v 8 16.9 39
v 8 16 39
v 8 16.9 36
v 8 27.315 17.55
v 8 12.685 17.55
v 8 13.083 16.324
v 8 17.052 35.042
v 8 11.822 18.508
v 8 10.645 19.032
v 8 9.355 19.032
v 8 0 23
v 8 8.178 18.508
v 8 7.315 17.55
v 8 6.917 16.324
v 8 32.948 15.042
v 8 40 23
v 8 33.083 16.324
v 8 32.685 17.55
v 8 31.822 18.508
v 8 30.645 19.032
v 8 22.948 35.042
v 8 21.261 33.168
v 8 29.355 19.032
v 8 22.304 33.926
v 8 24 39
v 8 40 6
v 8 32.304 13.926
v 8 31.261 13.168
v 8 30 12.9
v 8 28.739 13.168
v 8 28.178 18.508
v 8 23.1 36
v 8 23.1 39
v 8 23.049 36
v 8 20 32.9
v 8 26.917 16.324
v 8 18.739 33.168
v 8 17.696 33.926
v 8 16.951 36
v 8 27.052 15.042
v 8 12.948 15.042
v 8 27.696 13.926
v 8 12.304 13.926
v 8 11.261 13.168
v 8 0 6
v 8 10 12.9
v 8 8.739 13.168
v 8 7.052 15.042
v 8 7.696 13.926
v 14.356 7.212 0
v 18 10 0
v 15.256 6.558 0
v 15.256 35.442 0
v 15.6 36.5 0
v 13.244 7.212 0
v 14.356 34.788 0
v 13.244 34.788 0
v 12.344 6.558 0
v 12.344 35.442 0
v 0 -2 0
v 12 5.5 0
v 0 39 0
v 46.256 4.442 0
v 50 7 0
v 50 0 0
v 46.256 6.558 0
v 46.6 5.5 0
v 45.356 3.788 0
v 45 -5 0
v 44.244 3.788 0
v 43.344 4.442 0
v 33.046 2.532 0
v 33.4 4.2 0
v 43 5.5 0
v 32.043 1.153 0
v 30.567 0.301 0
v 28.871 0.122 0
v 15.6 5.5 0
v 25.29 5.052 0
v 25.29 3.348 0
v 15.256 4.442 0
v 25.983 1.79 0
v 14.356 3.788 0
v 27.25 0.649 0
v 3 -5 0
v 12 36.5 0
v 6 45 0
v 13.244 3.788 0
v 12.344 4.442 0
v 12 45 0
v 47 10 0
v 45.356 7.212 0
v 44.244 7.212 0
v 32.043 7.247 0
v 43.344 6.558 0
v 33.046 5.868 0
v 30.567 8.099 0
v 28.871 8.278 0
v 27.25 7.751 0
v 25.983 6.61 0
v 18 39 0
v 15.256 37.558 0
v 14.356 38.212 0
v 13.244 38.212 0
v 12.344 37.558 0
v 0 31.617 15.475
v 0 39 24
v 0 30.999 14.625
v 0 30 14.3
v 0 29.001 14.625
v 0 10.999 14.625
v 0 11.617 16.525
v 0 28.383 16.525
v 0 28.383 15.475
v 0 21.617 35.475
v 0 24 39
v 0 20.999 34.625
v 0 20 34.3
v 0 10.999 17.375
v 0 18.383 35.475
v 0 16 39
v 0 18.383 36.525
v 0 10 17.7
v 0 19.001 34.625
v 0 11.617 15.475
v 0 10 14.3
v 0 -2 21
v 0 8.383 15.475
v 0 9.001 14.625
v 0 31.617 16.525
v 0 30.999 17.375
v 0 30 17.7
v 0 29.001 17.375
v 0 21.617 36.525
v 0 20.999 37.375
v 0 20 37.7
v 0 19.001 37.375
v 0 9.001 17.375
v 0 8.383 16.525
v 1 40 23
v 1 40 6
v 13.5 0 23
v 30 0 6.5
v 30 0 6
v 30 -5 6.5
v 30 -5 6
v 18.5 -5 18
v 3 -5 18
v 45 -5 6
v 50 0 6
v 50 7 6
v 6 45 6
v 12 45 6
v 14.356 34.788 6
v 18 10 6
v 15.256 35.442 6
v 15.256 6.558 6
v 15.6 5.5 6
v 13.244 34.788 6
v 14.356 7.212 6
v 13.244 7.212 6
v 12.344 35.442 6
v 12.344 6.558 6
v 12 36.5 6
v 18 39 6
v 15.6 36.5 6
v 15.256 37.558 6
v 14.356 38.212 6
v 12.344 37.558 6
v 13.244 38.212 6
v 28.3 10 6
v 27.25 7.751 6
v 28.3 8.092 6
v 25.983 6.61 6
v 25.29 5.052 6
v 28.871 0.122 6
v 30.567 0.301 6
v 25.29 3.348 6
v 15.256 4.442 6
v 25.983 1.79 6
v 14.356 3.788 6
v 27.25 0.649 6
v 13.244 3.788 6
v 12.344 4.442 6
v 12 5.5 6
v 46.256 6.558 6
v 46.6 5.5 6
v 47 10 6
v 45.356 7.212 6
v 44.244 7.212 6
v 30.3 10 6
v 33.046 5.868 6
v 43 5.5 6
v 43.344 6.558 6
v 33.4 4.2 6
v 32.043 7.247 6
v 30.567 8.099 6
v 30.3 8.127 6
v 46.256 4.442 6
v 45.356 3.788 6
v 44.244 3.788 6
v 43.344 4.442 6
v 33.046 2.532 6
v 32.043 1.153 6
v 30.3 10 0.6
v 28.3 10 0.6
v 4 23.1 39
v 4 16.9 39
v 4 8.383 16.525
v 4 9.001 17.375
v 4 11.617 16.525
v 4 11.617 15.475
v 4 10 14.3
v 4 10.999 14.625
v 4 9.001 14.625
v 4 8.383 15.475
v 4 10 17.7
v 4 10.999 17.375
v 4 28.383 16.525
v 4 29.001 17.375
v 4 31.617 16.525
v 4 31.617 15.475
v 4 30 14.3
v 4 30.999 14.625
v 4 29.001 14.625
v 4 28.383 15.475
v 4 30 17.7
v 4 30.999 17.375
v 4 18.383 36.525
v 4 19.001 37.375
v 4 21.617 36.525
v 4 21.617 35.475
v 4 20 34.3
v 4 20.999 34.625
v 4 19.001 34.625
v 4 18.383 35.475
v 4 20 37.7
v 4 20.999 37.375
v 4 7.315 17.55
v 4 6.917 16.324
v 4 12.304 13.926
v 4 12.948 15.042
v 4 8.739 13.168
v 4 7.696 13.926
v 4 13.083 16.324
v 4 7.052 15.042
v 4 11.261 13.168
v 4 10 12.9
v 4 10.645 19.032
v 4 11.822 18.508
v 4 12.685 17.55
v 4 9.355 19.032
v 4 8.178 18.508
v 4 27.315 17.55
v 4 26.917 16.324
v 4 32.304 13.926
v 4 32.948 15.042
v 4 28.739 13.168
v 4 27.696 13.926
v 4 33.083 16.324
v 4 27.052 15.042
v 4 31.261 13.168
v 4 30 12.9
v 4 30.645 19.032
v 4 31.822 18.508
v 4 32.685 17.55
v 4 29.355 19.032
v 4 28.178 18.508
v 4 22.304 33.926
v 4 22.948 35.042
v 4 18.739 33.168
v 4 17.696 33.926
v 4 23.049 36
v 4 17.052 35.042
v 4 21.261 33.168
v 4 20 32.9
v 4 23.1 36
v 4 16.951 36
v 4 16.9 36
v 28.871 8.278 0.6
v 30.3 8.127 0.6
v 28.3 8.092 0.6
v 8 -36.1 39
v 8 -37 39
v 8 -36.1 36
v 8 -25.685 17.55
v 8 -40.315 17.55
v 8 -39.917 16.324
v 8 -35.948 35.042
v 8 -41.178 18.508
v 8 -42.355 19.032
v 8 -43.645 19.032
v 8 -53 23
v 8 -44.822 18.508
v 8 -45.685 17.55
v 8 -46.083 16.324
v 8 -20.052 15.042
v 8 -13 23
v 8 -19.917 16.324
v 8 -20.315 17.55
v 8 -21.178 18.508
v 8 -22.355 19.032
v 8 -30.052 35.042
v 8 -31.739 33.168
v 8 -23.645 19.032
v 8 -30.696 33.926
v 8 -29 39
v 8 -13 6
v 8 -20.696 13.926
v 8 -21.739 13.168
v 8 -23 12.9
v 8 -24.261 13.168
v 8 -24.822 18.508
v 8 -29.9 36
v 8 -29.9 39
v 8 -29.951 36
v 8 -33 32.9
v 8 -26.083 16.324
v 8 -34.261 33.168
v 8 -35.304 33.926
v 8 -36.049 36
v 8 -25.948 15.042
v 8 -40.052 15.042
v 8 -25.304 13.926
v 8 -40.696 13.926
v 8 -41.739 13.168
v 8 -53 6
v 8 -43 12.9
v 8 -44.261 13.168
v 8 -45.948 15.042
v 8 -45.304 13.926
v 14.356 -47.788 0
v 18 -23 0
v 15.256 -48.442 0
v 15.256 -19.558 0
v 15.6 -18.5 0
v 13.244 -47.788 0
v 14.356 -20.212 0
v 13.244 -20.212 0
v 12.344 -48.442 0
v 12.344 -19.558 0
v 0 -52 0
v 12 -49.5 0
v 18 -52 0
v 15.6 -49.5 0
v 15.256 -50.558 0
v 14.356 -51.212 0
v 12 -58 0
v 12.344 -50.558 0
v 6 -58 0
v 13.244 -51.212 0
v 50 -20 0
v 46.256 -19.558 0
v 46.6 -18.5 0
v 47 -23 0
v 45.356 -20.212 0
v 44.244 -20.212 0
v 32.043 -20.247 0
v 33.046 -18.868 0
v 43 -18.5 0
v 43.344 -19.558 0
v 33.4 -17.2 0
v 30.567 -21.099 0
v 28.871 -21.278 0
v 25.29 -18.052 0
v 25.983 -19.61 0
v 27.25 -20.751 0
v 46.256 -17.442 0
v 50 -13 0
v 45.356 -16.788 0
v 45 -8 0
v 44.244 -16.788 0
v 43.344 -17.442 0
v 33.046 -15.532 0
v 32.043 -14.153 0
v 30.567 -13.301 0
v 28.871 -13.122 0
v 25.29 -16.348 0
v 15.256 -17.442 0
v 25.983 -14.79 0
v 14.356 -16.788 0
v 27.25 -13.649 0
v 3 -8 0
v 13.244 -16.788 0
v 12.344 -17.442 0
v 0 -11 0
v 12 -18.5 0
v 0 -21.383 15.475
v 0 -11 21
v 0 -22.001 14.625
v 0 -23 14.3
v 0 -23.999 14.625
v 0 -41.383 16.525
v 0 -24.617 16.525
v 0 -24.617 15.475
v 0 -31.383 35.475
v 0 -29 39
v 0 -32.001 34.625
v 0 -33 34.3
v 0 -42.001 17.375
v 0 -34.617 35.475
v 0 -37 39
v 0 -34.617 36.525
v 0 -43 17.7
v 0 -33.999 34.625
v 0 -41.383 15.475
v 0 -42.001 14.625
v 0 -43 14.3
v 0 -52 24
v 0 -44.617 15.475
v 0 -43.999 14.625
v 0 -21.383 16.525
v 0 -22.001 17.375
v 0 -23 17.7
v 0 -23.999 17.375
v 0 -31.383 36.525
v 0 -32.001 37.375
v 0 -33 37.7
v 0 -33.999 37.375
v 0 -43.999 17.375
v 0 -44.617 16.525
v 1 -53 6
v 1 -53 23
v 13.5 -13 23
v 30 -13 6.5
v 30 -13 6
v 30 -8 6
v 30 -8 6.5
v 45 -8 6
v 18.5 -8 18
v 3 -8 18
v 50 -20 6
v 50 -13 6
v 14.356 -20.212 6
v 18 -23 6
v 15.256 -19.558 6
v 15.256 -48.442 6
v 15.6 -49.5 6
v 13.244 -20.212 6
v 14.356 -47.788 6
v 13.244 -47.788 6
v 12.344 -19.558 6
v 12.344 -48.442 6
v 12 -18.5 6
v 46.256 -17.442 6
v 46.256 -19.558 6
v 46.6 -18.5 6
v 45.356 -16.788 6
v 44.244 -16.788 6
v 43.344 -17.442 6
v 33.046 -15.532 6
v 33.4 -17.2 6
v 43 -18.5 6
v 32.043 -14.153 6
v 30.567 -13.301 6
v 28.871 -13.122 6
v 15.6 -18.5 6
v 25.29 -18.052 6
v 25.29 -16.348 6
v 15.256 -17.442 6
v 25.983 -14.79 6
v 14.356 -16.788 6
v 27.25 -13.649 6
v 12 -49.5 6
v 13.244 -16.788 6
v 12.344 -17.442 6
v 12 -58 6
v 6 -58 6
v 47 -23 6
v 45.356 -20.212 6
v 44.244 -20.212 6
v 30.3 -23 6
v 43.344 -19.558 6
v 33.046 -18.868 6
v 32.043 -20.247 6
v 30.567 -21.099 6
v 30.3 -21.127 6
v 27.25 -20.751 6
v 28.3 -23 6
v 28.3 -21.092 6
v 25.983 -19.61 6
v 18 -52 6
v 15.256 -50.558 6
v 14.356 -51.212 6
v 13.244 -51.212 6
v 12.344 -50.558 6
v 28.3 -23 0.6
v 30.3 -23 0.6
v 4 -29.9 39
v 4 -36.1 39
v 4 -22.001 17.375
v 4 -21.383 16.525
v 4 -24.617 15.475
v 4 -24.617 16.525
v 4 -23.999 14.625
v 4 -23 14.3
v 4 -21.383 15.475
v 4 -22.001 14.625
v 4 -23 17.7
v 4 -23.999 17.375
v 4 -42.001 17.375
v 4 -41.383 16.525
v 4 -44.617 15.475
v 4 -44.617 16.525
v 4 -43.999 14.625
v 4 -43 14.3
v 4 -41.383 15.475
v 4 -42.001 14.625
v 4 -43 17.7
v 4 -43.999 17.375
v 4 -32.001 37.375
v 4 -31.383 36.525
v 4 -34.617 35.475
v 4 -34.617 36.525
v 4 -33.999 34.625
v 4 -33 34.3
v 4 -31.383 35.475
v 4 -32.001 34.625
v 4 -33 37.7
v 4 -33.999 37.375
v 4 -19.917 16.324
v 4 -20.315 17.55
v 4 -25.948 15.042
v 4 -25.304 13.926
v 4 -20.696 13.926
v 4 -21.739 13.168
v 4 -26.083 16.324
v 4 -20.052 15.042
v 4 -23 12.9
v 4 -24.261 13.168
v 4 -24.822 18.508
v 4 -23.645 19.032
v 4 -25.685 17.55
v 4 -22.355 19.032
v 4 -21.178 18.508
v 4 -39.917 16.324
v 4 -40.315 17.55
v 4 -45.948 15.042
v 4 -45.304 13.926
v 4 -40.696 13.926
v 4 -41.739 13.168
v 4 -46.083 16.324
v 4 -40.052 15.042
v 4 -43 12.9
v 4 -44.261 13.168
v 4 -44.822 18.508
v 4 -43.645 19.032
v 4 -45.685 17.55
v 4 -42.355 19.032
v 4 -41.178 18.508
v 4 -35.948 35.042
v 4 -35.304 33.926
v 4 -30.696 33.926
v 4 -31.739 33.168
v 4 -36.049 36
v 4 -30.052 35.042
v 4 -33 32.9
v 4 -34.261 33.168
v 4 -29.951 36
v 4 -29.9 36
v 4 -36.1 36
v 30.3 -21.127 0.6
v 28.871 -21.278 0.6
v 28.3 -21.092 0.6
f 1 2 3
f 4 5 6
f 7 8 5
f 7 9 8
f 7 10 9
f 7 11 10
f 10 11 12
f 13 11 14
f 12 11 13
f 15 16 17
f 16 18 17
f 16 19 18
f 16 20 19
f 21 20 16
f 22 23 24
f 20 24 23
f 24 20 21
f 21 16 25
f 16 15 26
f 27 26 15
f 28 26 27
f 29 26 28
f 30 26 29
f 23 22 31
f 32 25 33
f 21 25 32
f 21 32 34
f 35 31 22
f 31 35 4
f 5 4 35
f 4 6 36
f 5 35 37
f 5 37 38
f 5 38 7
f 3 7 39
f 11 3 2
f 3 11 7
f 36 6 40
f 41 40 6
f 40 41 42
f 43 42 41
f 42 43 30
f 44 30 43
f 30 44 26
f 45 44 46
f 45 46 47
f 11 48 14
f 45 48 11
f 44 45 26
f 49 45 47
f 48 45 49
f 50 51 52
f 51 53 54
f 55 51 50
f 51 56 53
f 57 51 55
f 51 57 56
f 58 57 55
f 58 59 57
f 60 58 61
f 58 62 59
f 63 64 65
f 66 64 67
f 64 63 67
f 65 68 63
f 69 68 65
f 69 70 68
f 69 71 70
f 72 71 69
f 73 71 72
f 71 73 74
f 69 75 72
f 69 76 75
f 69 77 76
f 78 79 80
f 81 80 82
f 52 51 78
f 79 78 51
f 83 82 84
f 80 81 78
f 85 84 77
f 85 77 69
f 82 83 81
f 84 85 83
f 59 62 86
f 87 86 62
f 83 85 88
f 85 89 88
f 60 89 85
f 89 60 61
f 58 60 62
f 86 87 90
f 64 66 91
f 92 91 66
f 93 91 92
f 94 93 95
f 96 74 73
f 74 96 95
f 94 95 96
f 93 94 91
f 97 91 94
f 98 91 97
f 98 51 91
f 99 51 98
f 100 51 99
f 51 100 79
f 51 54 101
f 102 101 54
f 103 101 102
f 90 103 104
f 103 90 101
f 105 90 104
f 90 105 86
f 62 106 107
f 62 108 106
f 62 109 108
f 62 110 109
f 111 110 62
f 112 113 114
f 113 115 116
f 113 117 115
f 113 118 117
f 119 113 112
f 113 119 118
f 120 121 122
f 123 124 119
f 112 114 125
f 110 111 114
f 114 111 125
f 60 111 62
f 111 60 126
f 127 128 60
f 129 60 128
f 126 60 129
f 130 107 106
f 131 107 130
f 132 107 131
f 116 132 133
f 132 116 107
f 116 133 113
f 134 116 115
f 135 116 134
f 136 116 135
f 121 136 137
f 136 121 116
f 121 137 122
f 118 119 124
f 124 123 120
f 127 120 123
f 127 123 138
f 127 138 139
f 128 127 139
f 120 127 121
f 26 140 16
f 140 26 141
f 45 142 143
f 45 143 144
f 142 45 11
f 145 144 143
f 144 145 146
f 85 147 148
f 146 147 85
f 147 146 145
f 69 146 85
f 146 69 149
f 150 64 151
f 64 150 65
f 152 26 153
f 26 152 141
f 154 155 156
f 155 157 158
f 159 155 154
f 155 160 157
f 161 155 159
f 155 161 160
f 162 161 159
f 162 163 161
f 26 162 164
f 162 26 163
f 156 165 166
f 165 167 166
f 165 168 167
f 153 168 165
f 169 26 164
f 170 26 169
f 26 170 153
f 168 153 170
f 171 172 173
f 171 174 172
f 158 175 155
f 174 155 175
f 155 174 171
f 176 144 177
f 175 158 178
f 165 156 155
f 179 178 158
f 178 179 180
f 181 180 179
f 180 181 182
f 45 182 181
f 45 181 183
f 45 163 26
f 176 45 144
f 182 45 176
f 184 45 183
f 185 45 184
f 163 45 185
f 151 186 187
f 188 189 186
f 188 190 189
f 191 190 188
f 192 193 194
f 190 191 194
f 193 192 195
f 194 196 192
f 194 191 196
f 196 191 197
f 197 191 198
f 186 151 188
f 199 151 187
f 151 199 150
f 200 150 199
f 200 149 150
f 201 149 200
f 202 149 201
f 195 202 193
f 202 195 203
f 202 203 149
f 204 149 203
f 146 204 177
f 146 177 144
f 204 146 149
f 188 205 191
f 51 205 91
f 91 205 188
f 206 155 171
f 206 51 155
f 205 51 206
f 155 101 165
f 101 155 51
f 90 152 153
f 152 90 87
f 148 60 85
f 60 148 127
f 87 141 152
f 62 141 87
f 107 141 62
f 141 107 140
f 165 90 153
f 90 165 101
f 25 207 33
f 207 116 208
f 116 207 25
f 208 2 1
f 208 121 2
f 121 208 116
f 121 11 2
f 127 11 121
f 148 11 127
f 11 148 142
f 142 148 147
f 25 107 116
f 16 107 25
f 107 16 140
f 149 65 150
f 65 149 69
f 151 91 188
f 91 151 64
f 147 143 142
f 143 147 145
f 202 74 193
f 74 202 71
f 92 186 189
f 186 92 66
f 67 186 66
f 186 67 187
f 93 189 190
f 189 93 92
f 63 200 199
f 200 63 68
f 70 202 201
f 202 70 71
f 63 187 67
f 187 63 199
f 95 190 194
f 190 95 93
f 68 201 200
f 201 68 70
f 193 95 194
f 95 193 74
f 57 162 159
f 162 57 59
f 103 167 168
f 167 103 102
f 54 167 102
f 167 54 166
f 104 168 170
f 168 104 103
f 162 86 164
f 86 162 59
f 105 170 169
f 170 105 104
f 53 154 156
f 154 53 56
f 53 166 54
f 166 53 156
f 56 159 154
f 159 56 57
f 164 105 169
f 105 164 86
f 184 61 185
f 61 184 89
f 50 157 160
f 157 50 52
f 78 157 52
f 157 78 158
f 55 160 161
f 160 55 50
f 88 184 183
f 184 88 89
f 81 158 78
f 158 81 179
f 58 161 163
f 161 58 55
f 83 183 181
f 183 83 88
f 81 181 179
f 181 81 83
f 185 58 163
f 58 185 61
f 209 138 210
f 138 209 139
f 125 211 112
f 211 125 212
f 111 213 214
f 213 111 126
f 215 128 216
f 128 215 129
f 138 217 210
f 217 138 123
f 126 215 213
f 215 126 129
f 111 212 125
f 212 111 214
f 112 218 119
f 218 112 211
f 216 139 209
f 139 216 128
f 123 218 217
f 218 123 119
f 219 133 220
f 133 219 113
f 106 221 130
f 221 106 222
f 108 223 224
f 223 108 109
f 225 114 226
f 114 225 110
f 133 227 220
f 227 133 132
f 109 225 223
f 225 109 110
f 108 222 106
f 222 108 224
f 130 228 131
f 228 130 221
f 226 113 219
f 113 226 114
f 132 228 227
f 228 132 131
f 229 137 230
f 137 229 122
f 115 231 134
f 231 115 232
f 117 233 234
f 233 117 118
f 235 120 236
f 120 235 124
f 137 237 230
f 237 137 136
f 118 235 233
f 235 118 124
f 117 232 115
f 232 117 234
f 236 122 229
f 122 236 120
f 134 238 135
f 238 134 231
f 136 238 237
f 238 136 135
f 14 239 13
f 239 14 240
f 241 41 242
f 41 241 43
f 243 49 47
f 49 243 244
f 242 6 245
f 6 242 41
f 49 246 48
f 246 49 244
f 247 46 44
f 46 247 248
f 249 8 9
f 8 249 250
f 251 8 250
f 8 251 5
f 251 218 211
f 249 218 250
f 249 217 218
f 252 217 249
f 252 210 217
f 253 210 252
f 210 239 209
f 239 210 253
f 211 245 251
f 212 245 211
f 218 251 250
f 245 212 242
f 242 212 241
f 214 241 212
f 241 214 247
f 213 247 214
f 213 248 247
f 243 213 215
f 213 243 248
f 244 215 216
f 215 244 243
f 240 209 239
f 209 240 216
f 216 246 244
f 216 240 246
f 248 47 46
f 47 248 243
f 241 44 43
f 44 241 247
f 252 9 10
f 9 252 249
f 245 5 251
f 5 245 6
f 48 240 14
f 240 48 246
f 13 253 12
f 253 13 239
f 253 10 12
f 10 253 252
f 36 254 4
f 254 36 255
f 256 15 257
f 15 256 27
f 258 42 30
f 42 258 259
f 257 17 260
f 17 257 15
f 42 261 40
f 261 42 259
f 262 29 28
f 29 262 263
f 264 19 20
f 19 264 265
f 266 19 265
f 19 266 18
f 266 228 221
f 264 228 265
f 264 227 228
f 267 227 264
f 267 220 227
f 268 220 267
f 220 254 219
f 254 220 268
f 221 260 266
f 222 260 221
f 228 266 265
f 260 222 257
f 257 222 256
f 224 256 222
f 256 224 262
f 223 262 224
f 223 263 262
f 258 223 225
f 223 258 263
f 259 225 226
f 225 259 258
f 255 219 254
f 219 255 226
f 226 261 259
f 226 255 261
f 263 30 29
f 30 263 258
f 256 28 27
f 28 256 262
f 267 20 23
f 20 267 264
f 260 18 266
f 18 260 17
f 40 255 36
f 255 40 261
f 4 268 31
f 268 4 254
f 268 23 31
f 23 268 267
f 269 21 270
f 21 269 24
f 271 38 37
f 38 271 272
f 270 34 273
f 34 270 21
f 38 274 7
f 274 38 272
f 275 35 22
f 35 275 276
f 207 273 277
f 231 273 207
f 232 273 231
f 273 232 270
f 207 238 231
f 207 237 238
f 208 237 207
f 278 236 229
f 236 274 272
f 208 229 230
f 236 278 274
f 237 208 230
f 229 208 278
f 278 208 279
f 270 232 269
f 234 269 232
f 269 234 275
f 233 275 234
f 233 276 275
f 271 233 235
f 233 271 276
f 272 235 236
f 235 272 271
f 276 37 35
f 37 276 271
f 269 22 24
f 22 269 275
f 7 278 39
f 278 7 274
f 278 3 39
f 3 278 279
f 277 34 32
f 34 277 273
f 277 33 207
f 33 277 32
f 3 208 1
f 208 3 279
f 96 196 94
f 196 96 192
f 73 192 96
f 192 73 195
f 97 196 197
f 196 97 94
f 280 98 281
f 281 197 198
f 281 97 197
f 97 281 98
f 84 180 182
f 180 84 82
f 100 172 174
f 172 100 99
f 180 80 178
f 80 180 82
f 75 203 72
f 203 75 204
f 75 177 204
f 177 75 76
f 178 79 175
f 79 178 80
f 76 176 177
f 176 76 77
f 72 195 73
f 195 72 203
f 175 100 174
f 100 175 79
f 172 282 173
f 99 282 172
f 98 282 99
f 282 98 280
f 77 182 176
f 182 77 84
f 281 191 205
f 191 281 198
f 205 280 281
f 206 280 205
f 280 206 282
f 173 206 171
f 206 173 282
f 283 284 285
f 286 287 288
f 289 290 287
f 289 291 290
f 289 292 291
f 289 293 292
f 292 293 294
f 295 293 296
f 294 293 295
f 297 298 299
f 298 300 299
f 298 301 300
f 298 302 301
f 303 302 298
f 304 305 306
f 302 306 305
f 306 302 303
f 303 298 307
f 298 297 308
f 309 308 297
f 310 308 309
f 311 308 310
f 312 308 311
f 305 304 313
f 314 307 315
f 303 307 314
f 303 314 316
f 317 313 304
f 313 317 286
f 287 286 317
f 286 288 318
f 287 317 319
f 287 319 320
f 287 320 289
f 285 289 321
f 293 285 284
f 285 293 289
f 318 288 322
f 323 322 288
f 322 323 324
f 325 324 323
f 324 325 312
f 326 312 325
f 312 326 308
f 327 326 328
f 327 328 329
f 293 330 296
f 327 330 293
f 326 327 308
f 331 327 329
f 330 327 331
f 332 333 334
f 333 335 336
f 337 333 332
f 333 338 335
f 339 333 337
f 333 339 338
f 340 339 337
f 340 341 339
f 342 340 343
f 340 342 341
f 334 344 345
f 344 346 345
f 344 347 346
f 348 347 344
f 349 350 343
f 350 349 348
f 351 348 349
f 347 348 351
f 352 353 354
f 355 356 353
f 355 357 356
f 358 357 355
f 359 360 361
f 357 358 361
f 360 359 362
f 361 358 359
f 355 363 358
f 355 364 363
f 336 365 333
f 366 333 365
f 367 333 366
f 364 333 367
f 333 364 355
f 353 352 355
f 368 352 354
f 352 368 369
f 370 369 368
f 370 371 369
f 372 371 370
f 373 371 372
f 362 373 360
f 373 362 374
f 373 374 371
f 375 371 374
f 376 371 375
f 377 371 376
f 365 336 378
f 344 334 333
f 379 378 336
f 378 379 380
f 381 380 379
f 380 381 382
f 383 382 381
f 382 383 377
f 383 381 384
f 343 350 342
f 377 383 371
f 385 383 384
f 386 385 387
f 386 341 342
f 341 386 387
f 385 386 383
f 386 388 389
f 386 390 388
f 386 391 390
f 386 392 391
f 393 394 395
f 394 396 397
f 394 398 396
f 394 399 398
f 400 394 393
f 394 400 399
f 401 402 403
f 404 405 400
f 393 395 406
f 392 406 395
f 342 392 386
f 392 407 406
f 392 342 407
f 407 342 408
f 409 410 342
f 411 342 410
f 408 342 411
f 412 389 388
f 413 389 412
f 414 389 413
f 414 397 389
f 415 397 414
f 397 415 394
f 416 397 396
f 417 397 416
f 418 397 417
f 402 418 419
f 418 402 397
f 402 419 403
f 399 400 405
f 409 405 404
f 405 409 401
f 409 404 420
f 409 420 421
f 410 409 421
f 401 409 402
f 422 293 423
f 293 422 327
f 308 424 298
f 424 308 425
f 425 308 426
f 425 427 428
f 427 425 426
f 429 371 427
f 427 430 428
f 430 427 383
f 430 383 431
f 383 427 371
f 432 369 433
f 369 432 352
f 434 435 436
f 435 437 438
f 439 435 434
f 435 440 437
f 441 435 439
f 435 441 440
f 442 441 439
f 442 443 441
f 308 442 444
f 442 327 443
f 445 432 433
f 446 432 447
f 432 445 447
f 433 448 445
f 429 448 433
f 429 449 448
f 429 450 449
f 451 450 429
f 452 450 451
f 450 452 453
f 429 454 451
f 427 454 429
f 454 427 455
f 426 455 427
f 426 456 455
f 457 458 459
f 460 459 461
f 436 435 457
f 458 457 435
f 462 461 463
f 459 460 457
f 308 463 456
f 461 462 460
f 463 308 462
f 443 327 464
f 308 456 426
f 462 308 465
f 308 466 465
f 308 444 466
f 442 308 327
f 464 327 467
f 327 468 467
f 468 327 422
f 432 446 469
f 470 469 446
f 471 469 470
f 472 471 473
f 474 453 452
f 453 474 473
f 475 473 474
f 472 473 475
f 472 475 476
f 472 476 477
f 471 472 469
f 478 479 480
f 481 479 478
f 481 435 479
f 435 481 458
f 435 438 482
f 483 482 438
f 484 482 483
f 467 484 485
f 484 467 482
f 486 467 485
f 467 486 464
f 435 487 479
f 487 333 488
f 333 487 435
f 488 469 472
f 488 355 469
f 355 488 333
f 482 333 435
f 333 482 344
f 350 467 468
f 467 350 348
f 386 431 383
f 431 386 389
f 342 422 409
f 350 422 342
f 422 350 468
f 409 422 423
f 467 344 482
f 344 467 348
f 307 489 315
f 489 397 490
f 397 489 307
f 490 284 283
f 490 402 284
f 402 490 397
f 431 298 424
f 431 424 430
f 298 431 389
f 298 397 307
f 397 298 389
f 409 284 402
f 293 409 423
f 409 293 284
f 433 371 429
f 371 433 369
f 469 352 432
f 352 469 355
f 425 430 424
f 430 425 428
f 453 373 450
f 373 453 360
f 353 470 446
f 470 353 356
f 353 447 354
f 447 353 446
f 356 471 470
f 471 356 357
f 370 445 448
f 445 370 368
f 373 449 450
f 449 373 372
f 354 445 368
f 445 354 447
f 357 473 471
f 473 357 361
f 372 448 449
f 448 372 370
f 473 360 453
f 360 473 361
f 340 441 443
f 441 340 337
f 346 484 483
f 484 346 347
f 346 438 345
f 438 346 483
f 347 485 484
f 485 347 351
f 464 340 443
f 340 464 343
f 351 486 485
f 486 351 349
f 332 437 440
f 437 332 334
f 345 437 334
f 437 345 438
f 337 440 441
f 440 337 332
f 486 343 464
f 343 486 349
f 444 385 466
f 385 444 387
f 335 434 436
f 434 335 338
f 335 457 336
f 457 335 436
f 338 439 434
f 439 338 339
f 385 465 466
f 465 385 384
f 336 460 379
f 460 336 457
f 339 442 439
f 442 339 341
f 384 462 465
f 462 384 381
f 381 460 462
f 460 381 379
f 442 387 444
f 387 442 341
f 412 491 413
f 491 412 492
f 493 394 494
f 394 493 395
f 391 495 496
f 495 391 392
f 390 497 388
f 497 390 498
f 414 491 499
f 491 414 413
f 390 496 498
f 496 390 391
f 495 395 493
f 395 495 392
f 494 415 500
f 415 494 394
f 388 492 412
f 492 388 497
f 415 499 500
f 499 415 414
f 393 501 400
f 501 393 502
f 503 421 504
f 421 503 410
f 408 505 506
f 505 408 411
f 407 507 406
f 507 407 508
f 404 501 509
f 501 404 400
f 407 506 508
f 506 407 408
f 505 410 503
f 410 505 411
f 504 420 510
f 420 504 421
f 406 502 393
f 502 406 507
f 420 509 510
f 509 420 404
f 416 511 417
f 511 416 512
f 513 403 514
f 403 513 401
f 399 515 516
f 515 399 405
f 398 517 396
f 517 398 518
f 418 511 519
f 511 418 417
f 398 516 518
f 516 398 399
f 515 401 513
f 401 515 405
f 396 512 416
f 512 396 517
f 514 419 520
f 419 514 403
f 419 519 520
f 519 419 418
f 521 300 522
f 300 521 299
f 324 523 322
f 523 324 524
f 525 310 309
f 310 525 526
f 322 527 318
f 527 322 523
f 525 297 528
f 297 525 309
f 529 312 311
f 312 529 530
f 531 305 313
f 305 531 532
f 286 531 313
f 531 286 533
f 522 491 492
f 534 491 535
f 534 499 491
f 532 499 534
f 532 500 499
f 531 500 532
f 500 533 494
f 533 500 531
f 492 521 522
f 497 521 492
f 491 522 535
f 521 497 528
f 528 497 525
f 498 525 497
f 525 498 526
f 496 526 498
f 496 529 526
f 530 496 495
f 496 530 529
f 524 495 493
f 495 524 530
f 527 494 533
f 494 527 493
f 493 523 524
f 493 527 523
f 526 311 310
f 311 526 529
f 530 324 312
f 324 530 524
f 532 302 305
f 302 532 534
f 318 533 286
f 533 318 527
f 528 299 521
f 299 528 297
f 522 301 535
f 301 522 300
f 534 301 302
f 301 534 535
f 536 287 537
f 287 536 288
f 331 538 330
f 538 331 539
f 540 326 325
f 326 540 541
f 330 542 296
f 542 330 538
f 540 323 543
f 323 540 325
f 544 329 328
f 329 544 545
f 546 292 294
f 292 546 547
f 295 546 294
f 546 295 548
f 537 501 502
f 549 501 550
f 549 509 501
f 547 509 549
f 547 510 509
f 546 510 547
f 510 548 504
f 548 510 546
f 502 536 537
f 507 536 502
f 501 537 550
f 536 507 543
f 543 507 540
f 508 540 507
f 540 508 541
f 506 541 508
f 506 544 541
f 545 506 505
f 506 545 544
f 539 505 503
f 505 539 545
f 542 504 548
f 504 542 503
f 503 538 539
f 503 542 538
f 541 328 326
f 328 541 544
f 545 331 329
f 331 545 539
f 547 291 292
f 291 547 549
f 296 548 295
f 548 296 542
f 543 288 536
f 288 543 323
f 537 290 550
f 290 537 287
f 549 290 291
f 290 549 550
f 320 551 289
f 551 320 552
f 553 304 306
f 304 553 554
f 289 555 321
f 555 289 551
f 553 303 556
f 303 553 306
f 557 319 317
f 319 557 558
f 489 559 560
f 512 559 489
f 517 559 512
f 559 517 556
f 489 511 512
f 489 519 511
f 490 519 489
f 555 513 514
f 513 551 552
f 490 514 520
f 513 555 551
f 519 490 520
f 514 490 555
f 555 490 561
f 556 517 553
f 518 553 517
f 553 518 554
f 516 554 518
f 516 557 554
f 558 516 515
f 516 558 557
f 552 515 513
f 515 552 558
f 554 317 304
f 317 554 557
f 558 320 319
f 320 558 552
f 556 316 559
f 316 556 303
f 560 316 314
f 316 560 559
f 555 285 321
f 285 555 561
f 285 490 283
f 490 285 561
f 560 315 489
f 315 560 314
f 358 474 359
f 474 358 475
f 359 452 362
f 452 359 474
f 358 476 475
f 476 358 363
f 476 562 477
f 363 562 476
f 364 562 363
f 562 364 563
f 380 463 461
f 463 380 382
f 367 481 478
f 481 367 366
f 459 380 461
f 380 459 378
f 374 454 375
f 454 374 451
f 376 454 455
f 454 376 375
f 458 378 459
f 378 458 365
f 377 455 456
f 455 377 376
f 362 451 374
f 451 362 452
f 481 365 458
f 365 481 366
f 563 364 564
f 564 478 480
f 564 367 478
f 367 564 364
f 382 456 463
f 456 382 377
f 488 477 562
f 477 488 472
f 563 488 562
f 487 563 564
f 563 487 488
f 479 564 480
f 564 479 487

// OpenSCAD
// PRUSA iteration3
// Z axis bottom holder
// GNU GPL v3
// Josef Průša <iam@josefprusa.cz> and contributors
// http://www.reprap.org/wiki/Prusa_Mendel
// http://prusamendel.org

module z_bottom_base() {
  translate([0,0,0]) cube([8,40,16+25]); // plate touching the base
  translate([0,-5,0]) cube([30,5,22+1]); // plate touching the base
  translate([0,-5,0]) cube([50,15,5+1]); // plate touching the base
  translate([0,-5,0]) cube([18,50,5+1]);
}

module z_bottom_fancy() {
  // corner cutouts
  translate([0.5,-2.5,0]) rotate([0,0,-45-180]) translate([-15,0,-1]) cube([30,30,51]);
  translate([0.5,40-0.5,0]) rotate([0,0,-45+90]) translate([-15,0,-1]) cube([30,30,51]);
  //translate([-4,40+5,5]) rotate([0,0,-35-0]) translate([0,0,0.1]) cube([30,30,51]);
  translate([-4+11,40+5+5,0]) rotate([0,0,-45-0]) translate([0,0,-1]) cube([30,30,51]);
  translate([8,0,12+20+6+1]) rotate([0,-90,0]) translate([0,-5,0]) cube([30,50,30]);
  translate([20,-2,12+8+1]) rotate([45,0,0]) rotate([0,-90,0]) translate([0,-5,0]) cube([30,50,30]);
  translate([8,20,12+30+1]) rotate([-45,0,0]) rotate([0,-90,0]) translate([0,-5,0]) cube([30,50,30]);
  translate([50-2.5,-5+2.5,0]) rotate([0,0,-45-90]) translate([-15,0,-1]) cube([30,30,51]);
  translate([50-1.5,10-1.5,0]) rotate([0,0,-45]) translate([-15,0,-1]) cube([30,30,51]);
  //translate([0,0,5]) rotate([45+180,0,0]) rotate([0,0,-45+90]) translate([0,0,-15]) cube([30,30,30]);

  // Stiffner cut out
  translate([30,0,5.5+1]) rotate([0,-45,0]) translate([0,-5,0]) cube([30,50,30]);
}

module z_bottom_holes() {
  // Frame mounting screw holes
  translate([-1,10,10+5+1]) rotate([0,90,0]) cylinder(h = 20, r = 1.7, $fn = 10);
  translate([-1,10+20,10+5+1]) rotate([0,90,0]) cylinder(h = 20, r = 1.7, $fn = 10);
  translate([-1,10+10,10+20+5+1]) rotate([0,90,0]) cylinder(h = 20, r = 1.7, $fn = 10);

  // Frame mounting screw head holes
  translate([4,10,10+5+1]) rotate([0,90,0]) cylinder(h = 20, r = 3.1, $fn = 15);
  translate([4,10+20,10+5+1]) rotate([0,90,0]) cylinder(h = 20, r = 3.1, $fn = 15);
  translate([4,10+10,10+20+5+1]) rotate([0,90,0]) cylinder(h = 20, r = 3.1, $fn = 15);
  translate([4,10+10-3.1,10+20+5+1]) cube([10,6.2,10]);

  // Z rod holder
  translate([25+4.3,4.2,-1]) rotate([0,0,0]) cylinder(h = 50, r = 4.1, $fn = 15);
  translate([25+4.3-1,3,0.6]) cube([2,10,7]); // it's bit up because it helps with printing

  // Motor mounting
  translate([25+4.3,21,-1]) {
    //translate([15.5,15.5,-1]) cylinder(h = 20, r=1.8, $fn=10);
    translate([15.5,-15.5,-1]) cylinder(h = 20, r = 1.8, $fn = 10);
    translate([-15.5,15.5,-1]) cylinder(h = 20, r = 1.8, $fn = 10);
    translate([-15.5,-15.5,-1]) cylinder(h = 20, r = 1.8, $fn = 10);
  }
}

// Final part
module z_bottom_holder() {
  difference(){
    z_bottom_base();
    z_bottom_fancy();
    z_bottom_holes();
  }
  translate([0,-13,0]) mirror([0,1,0]) difference() {
    z_bottom_base();
    z_bottom_fancy();
    z_bottom_holes();
  }
}

z_bottom_holder();
